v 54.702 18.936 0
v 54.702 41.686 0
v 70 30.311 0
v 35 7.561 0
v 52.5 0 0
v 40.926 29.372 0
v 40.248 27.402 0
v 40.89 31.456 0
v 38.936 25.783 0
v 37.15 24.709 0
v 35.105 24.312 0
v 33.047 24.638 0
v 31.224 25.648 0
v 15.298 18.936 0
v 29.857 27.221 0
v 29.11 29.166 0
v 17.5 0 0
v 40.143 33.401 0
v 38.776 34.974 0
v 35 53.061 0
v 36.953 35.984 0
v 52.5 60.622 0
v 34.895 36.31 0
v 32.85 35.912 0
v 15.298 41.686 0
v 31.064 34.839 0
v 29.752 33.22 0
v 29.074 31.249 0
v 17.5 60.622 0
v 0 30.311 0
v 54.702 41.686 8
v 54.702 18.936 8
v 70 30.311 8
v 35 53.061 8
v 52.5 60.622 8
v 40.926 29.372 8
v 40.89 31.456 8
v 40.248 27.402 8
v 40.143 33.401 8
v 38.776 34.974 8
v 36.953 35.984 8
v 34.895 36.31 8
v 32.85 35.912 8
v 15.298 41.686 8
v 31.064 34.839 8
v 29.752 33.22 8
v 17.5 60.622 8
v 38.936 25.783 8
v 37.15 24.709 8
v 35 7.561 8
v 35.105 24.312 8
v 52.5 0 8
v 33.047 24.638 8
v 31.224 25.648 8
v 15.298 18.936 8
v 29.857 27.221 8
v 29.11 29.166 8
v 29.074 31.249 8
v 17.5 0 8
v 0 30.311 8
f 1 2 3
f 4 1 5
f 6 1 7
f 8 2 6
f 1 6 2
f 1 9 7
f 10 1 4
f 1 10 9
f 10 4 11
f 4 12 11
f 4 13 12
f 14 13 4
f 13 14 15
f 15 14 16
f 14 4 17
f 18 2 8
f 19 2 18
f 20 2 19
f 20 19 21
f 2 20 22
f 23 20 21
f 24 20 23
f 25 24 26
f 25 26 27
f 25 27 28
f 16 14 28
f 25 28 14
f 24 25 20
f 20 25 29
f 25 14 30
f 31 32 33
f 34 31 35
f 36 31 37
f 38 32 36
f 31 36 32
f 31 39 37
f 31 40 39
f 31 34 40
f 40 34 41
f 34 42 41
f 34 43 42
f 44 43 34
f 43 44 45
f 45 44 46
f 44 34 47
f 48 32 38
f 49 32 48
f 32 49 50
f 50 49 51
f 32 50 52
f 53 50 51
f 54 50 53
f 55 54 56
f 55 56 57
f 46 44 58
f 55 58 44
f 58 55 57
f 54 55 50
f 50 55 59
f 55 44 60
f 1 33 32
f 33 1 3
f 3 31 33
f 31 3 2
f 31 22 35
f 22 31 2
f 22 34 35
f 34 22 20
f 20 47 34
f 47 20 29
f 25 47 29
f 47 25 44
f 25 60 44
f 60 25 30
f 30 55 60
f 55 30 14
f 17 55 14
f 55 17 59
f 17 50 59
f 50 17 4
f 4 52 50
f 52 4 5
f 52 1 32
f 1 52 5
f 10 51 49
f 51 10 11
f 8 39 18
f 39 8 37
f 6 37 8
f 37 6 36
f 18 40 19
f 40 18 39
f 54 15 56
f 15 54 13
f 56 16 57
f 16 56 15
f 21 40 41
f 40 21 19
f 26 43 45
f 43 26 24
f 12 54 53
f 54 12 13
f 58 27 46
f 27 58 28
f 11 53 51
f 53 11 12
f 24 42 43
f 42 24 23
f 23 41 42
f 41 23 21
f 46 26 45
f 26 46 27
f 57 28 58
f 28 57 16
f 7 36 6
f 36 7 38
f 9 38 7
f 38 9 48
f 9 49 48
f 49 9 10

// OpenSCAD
$fn = 32;

// ----------------------------------------------------------------------
// Star wheel: 6-point blunt, R35
// ----------------------------------------------------------------------

// --- parameters (mm) ---
n_points = 6;             // number of points / teeth
r_out = 35;               // tip radius
r_in = 22.75;             // root radius
bore_r = 6;               // centre bore radius
plate_t = 8;              // plate thickness, Z (extrusion height)
bore_d = 12;              // centre bore diameter

profile = [[0, 30.311], [15.298, 18.936], [17.5, 0], [35, 7.561], [52.5, 0], [54.702, 18.936], [70, 30.311], [54.702, 41.686], [52.5, 60.622], [35, 53.061], [17.5, 60.622], [15.298, 41.686]];  // primary outline, 12 points, counter clockwise
void_1 = [[40.89, 31.456], [40.143, 33.401], [38.776, 34.974], [36.953, 35.984], [34.895, 36.31], [32.85, 35.912], [31.064, 34.839], [29.752, 33.22], [29.074, 31.249], [29.11, 29.166], [29.857, 27.221], [31.224, 25.648], [33.047, 24.638], [35.105, 24.312], [37.15, 24.709], [38.936, 25.783], [40.248, 27.402], [40.926, 29.372]];  // centre bore, 18 points

// --- the one profile operation ---
difference() {
  linear_extrude(height = plate_t) polygon(points = profile);
  translate([0, 0, -1])
    linear_extrude(height = plate_t + 2) polygon(points = void_1);
}
